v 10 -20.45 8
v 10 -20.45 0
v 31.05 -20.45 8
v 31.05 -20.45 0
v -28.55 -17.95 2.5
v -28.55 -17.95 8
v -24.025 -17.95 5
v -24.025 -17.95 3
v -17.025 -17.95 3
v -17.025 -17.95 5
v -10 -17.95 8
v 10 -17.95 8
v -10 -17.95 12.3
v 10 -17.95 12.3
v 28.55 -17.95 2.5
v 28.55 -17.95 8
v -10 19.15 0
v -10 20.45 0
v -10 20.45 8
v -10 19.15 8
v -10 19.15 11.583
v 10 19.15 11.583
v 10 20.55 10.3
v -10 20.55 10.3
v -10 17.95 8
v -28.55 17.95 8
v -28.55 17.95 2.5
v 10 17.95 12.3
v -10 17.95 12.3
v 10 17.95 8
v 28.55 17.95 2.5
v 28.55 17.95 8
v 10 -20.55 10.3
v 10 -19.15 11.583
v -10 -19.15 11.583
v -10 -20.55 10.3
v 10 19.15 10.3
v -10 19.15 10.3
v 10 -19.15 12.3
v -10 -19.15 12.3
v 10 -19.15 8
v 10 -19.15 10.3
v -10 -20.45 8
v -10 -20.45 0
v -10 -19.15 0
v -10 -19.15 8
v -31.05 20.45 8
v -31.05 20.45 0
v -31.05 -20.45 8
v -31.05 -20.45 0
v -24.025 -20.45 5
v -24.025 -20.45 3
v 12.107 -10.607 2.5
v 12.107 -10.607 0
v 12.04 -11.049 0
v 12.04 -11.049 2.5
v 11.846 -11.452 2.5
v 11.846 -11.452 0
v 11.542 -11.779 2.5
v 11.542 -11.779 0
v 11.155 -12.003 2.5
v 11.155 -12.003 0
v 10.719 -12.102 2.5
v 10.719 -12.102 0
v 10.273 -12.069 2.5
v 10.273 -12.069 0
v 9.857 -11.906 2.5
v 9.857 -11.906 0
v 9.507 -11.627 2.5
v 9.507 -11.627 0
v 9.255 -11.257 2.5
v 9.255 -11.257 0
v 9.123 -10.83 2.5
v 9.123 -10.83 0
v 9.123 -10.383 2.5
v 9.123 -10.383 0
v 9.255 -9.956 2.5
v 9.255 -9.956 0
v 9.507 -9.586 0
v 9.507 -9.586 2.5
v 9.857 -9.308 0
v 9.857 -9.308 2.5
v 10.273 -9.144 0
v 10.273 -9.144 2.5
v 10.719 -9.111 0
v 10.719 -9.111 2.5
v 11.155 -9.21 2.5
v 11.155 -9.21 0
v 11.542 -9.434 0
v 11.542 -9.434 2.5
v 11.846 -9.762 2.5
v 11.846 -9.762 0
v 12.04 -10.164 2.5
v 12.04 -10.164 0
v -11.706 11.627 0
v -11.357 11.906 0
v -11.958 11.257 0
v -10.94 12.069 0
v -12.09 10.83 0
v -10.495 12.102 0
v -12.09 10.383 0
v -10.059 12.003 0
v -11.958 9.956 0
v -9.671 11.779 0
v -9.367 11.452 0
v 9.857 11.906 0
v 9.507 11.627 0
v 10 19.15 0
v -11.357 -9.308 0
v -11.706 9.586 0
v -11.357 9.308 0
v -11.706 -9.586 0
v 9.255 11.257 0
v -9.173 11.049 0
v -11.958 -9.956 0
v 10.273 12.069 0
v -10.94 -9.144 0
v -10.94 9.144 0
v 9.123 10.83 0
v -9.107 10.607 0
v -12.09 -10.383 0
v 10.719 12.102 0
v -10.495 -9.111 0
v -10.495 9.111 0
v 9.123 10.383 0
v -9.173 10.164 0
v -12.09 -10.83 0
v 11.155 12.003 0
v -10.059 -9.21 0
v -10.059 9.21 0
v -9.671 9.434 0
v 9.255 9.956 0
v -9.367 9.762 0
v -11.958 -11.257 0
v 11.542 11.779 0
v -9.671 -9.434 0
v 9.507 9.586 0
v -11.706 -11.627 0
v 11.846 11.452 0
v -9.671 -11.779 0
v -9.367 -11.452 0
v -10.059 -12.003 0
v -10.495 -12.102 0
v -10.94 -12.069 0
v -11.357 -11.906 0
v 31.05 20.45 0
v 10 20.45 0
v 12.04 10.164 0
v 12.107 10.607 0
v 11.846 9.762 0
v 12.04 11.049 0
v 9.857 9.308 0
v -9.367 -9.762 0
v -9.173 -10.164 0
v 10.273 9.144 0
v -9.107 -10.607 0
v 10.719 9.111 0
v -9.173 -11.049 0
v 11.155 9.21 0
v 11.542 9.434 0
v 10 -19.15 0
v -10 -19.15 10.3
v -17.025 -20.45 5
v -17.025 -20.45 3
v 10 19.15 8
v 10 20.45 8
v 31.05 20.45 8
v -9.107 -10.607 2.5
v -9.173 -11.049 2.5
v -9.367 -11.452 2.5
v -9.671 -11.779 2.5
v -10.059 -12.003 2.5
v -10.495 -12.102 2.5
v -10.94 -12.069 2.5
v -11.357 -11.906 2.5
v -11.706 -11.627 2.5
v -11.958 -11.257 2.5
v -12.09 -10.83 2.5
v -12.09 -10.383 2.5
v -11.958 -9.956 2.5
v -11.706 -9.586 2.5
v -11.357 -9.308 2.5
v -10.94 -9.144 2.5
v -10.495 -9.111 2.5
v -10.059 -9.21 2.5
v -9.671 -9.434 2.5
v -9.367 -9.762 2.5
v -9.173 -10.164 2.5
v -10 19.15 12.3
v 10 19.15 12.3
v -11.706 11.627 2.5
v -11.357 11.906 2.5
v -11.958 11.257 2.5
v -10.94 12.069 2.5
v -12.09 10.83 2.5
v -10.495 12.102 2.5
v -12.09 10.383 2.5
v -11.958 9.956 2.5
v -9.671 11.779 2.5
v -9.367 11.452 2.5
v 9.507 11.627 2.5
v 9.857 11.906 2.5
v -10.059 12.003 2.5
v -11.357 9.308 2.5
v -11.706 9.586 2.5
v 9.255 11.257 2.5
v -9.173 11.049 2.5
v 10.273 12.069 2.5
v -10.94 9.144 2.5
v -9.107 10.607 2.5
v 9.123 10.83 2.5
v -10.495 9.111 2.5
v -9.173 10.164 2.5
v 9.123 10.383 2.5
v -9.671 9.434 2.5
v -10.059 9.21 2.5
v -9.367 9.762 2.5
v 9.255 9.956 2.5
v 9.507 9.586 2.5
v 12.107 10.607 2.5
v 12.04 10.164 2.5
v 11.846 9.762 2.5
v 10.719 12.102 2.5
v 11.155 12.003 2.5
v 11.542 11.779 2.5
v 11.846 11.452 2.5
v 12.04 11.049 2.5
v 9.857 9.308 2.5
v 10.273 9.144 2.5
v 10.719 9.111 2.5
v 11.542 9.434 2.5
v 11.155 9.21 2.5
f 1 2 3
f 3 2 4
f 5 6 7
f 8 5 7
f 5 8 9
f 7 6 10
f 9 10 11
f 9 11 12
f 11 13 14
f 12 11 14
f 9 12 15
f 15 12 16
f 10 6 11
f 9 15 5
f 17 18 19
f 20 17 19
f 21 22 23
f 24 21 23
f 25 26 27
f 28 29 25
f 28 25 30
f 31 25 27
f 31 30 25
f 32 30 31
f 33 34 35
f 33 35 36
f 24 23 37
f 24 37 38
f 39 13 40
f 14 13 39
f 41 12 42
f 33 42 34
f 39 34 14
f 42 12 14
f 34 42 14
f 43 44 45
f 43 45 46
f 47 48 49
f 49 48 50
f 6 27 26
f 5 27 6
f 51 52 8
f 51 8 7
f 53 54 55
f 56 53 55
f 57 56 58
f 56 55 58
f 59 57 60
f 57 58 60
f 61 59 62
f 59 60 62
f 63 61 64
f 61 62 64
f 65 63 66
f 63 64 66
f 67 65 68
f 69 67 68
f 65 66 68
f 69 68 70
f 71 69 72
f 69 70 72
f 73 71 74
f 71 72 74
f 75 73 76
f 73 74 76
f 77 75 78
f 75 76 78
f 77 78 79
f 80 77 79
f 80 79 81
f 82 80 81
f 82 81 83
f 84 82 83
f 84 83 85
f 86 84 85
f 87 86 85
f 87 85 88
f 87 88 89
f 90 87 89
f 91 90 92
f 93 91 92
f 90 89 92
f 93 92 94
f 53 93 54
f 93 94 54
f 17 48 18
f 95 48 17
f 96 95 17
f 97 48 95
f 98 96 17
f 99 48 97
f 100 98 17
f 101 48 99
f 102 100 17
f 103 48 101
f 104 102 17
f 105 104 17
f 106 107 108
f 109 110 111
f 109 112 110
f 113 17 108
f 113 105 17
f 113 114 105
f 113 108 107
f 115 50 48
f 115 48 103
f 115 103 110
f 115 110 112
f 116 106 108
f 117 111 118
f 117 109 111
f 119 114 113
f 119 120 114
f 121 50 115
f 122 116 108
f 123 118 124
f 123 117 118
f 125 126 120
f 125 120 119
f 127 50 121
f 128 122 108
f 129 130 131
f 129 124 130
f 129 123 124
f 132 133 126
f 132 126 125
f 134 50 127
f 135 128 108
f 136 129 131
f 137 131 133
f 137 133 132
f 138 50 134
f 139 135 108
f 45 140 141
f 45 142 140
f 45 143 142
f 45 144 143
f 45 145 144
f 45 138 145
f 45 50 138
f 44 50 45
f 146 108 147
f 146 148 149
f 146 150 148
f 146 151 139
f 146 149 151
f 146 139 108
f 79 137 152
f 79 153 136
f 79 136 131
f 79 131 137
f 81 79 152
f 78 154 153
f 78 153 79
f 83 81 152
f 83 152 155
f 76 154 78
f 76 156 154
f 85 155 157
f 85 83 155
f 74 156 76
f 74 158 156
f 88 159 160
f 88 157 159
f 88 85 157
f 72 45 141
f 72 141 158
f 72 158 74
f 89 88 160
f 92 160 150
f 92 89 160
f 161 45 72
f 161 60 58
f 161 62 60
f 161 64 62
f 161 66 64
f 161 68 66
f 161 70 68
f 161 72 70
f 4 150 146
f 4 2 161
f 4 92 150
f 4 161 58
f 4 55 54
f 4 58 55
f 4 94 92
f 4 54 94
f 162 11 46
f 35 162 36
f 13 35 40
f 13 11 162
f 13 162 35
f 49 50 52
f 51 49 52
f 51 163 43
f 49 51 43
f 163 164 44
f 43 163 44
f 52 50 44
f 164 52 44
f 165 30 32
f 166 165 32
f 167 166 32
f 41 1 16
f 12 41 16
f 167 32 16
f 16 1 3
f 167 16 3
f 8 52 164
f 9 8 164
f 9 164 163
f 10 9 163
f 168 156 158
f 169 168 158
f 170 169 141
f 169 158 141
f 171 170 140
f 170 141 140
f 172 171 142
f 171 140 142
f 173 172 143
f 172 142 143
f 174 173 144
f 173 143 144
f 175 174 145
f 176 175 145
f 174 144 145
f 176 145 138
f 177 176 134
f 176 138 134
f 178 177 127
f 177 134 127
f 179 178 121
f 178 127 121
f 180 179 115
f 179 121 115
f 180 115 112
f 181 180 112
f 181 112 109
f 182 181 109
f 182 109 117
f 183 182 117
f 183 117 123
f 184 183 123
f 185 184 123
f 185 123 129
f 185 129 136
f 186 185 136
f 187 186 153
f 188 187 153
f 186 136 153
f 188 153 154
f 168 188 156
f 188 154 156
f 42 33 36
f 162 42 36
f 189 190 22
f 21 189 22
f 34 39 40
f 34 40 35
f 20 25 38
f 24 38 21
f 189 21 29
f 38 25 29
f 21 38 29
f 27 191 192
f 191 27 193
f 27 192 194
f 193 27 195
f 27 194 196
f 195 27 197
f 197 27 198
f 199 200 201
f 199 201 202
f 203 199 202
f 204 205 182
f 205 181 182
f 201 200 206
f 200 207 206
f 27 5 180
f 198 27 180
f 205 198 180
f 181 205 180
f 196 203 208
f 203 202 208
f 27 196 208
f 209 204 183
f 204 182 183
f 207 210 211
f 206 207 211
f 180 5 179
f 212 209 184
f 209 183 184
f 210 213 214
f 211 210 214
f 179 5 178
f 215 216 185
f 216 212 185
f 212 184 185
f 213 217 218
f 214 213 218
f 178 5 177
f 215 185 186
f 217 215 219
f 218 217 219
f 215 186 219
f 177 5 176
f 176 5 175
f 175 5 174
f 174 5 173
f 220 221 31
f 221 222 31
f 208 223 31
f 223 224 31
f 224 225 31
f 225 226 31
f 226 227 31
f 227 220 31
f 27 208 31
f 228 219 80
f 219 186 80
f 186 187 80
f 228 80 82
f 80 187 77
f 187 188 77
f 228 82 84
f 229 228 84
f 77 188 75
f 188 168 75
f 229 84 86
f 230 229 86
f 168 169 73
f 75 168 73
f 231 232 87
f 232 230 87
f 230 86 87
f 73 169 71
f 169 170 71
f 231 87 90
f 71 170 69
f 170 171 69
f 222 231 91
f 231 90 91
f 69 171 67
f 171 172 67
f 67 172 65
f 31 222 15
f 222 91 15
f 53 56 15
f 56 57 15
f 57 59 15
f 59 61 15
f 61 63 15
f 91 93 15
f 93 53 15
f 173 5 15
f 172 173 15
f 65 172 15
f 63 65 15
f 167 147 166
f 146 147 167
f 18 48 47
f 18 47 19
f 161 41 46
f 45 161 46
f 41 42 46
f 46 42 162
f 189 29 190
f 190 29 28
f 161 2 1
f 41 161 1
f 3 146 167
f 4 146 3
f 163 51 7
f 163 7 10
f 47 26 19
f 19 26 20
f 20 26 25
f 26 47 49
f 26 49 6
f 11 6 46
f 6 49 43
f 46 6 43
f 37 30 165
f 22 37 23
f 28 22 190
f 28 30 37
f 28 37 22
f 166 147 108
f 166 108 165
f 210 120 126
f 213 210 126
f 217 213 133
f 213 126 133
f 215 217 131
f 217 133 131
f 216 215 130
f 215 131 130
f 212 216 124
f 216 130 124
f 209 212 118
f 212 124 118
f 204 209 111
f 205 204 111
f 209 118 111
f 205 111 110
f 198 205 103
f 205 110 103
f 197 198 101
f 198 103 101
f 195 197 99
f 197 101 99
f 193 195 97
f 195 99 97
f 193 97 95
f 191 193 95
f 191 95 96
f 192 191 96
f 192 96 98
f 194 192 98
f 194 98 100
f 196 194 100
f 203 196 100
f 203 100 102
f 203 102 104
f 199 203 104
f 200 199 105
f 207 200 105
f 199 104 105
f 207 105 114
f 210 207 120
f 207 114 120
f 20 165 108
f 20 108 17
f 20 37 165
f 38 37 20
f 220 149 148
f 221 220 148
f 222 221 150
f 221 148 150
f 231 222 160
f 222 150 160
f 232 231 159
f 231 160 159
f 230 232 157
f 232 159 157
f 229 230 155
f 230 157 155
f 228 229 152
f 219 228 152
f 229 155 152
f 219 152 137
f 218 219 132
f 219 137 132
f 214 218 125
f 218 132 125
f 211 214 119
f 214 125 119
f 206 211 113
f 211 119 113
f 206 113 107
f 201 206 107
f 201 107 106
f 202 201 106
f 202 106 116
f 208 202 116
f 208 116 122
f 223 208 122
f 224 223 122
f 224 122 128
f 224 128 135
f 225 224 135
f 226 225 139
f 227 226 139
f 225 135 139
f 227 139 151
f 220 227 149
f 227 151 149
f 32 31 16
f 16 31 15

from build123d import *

# Parameters (mm, degrees)
F0_W           = 62.1
F0_H           = 40.9
F1_DEPTH       = 8
F2_T           = -2.5
F3_W           = 20
F3_H           = 12.3
F4_DEPTH       = 2.6
F5_W           = 20
F5_H           = 10.3
F6_DEPTH       = 1.4
F8_DEPTH       = 20
F9_W           = 81.3839174807
F9_H           = 28.7151690573
F10_DEPTH      = 2.501
F10_DEPTH_BACK = 9.801
F12_W          = 7
F12_H          = 2
F13_DEPTH      = 2.5
F14_R          = 1.5
F15_DEPTH      = 2.5


with BuildPart() as f1:
    # F0 (on Top) → F1 (new body)
    with BuildSketch(Plane.XY):
        Rectangle(F0_W, F0_H)
    extrude(amount=F1_DEPTH)

    # F2
    f2_openings = [f1.faces().sort_by_distance(p)[0] for p in [
        (0, 0, 8),
    ]]
    offset(amount=F2_T, openings=f2_openings)

    # F3 (on face) → F4 (join)
    with BuildSketch(Plane.XZ.offset(-17.95)):
        with Locations((0, 6.15)):
            Rectangle(F3_W, F3_H)
    extrude(amount=-F4_DEPTH)

    # F5 (on face) → F6 (cut)
    with BuildSketch(Plane(origin=(0, 20.55, 0), x_dir=(-1, 0, 0), z_dir=(0, 1, 0))):
        with Locations((0, 5.15)):
            Rectangle(F5_W, F5_H)
    extrude(amount=-F6_DEPTH, mode=Mode.SUBTRACT)

    # F7 (on face) → F8 (cut, through all)
    with BuildSketch(Plane.YZ.offset(10)):
        Polygon((19.15, 11.5828160197), (20.55, 10.3), (20.55, 12.3), (19.15, 12.3), align=None)
    extrude(amount=-F8_DEPTH, mode=Mode.SUBTRACT)

    # F9 (on face) → F10 (cut, two sides)
    with BuildSketch(Plane.XY.offset(2.5)) as f10_sk:
        with Locations((-1.038512215, -14.3575845286)):
            Rectangle(F9_W, F9_H)
    extrude(amount=-F10_DEPTH, mode=Mode.SUBTRACT)
    extrude(f10_sk.sketch, amount=F10_DEPTH_BACK, mode=Mode.SUBTRACT)

    # F11: F1 across plane


with BuildPart() as f1_1:
    add(f1.part)
    add(f1.part.mirror(Plane.XZ))

    # F12 (on face) → F13 (cut, through all)
    with BuildSketch(Plane.XZ.offset(20.45)):
        with Locations((-20.525, 4)):
            Rectangle(F12_W, F12_H)
    extrude(amount=-F13_DEPTH, mode=Mode.SUBTRACT)

    # F14 (on face) → F15 (cut, through all)
    with BuildSketch(Plane(origin=(0, 0, 0), x_dir=(1, 0, 0), z_dir=(0, 0, -1))):
        with Locations((-10.6066017178, 10.6066017178)):
            Circle(F14_R)
        with Locations((10.6066017178, 10.6066017178)):
            Circle(F14_R)
        with Locations((10.6066017178, -10.6066017178)):
            Circle(F14_R)
        with Locations((-10.6066017178, -10.6066017178)):
            Circle(F14_R)
    extrude(amount=-F15_DEPTH, mode=Mode.SUBTRACT)


solid = f1_1.part
